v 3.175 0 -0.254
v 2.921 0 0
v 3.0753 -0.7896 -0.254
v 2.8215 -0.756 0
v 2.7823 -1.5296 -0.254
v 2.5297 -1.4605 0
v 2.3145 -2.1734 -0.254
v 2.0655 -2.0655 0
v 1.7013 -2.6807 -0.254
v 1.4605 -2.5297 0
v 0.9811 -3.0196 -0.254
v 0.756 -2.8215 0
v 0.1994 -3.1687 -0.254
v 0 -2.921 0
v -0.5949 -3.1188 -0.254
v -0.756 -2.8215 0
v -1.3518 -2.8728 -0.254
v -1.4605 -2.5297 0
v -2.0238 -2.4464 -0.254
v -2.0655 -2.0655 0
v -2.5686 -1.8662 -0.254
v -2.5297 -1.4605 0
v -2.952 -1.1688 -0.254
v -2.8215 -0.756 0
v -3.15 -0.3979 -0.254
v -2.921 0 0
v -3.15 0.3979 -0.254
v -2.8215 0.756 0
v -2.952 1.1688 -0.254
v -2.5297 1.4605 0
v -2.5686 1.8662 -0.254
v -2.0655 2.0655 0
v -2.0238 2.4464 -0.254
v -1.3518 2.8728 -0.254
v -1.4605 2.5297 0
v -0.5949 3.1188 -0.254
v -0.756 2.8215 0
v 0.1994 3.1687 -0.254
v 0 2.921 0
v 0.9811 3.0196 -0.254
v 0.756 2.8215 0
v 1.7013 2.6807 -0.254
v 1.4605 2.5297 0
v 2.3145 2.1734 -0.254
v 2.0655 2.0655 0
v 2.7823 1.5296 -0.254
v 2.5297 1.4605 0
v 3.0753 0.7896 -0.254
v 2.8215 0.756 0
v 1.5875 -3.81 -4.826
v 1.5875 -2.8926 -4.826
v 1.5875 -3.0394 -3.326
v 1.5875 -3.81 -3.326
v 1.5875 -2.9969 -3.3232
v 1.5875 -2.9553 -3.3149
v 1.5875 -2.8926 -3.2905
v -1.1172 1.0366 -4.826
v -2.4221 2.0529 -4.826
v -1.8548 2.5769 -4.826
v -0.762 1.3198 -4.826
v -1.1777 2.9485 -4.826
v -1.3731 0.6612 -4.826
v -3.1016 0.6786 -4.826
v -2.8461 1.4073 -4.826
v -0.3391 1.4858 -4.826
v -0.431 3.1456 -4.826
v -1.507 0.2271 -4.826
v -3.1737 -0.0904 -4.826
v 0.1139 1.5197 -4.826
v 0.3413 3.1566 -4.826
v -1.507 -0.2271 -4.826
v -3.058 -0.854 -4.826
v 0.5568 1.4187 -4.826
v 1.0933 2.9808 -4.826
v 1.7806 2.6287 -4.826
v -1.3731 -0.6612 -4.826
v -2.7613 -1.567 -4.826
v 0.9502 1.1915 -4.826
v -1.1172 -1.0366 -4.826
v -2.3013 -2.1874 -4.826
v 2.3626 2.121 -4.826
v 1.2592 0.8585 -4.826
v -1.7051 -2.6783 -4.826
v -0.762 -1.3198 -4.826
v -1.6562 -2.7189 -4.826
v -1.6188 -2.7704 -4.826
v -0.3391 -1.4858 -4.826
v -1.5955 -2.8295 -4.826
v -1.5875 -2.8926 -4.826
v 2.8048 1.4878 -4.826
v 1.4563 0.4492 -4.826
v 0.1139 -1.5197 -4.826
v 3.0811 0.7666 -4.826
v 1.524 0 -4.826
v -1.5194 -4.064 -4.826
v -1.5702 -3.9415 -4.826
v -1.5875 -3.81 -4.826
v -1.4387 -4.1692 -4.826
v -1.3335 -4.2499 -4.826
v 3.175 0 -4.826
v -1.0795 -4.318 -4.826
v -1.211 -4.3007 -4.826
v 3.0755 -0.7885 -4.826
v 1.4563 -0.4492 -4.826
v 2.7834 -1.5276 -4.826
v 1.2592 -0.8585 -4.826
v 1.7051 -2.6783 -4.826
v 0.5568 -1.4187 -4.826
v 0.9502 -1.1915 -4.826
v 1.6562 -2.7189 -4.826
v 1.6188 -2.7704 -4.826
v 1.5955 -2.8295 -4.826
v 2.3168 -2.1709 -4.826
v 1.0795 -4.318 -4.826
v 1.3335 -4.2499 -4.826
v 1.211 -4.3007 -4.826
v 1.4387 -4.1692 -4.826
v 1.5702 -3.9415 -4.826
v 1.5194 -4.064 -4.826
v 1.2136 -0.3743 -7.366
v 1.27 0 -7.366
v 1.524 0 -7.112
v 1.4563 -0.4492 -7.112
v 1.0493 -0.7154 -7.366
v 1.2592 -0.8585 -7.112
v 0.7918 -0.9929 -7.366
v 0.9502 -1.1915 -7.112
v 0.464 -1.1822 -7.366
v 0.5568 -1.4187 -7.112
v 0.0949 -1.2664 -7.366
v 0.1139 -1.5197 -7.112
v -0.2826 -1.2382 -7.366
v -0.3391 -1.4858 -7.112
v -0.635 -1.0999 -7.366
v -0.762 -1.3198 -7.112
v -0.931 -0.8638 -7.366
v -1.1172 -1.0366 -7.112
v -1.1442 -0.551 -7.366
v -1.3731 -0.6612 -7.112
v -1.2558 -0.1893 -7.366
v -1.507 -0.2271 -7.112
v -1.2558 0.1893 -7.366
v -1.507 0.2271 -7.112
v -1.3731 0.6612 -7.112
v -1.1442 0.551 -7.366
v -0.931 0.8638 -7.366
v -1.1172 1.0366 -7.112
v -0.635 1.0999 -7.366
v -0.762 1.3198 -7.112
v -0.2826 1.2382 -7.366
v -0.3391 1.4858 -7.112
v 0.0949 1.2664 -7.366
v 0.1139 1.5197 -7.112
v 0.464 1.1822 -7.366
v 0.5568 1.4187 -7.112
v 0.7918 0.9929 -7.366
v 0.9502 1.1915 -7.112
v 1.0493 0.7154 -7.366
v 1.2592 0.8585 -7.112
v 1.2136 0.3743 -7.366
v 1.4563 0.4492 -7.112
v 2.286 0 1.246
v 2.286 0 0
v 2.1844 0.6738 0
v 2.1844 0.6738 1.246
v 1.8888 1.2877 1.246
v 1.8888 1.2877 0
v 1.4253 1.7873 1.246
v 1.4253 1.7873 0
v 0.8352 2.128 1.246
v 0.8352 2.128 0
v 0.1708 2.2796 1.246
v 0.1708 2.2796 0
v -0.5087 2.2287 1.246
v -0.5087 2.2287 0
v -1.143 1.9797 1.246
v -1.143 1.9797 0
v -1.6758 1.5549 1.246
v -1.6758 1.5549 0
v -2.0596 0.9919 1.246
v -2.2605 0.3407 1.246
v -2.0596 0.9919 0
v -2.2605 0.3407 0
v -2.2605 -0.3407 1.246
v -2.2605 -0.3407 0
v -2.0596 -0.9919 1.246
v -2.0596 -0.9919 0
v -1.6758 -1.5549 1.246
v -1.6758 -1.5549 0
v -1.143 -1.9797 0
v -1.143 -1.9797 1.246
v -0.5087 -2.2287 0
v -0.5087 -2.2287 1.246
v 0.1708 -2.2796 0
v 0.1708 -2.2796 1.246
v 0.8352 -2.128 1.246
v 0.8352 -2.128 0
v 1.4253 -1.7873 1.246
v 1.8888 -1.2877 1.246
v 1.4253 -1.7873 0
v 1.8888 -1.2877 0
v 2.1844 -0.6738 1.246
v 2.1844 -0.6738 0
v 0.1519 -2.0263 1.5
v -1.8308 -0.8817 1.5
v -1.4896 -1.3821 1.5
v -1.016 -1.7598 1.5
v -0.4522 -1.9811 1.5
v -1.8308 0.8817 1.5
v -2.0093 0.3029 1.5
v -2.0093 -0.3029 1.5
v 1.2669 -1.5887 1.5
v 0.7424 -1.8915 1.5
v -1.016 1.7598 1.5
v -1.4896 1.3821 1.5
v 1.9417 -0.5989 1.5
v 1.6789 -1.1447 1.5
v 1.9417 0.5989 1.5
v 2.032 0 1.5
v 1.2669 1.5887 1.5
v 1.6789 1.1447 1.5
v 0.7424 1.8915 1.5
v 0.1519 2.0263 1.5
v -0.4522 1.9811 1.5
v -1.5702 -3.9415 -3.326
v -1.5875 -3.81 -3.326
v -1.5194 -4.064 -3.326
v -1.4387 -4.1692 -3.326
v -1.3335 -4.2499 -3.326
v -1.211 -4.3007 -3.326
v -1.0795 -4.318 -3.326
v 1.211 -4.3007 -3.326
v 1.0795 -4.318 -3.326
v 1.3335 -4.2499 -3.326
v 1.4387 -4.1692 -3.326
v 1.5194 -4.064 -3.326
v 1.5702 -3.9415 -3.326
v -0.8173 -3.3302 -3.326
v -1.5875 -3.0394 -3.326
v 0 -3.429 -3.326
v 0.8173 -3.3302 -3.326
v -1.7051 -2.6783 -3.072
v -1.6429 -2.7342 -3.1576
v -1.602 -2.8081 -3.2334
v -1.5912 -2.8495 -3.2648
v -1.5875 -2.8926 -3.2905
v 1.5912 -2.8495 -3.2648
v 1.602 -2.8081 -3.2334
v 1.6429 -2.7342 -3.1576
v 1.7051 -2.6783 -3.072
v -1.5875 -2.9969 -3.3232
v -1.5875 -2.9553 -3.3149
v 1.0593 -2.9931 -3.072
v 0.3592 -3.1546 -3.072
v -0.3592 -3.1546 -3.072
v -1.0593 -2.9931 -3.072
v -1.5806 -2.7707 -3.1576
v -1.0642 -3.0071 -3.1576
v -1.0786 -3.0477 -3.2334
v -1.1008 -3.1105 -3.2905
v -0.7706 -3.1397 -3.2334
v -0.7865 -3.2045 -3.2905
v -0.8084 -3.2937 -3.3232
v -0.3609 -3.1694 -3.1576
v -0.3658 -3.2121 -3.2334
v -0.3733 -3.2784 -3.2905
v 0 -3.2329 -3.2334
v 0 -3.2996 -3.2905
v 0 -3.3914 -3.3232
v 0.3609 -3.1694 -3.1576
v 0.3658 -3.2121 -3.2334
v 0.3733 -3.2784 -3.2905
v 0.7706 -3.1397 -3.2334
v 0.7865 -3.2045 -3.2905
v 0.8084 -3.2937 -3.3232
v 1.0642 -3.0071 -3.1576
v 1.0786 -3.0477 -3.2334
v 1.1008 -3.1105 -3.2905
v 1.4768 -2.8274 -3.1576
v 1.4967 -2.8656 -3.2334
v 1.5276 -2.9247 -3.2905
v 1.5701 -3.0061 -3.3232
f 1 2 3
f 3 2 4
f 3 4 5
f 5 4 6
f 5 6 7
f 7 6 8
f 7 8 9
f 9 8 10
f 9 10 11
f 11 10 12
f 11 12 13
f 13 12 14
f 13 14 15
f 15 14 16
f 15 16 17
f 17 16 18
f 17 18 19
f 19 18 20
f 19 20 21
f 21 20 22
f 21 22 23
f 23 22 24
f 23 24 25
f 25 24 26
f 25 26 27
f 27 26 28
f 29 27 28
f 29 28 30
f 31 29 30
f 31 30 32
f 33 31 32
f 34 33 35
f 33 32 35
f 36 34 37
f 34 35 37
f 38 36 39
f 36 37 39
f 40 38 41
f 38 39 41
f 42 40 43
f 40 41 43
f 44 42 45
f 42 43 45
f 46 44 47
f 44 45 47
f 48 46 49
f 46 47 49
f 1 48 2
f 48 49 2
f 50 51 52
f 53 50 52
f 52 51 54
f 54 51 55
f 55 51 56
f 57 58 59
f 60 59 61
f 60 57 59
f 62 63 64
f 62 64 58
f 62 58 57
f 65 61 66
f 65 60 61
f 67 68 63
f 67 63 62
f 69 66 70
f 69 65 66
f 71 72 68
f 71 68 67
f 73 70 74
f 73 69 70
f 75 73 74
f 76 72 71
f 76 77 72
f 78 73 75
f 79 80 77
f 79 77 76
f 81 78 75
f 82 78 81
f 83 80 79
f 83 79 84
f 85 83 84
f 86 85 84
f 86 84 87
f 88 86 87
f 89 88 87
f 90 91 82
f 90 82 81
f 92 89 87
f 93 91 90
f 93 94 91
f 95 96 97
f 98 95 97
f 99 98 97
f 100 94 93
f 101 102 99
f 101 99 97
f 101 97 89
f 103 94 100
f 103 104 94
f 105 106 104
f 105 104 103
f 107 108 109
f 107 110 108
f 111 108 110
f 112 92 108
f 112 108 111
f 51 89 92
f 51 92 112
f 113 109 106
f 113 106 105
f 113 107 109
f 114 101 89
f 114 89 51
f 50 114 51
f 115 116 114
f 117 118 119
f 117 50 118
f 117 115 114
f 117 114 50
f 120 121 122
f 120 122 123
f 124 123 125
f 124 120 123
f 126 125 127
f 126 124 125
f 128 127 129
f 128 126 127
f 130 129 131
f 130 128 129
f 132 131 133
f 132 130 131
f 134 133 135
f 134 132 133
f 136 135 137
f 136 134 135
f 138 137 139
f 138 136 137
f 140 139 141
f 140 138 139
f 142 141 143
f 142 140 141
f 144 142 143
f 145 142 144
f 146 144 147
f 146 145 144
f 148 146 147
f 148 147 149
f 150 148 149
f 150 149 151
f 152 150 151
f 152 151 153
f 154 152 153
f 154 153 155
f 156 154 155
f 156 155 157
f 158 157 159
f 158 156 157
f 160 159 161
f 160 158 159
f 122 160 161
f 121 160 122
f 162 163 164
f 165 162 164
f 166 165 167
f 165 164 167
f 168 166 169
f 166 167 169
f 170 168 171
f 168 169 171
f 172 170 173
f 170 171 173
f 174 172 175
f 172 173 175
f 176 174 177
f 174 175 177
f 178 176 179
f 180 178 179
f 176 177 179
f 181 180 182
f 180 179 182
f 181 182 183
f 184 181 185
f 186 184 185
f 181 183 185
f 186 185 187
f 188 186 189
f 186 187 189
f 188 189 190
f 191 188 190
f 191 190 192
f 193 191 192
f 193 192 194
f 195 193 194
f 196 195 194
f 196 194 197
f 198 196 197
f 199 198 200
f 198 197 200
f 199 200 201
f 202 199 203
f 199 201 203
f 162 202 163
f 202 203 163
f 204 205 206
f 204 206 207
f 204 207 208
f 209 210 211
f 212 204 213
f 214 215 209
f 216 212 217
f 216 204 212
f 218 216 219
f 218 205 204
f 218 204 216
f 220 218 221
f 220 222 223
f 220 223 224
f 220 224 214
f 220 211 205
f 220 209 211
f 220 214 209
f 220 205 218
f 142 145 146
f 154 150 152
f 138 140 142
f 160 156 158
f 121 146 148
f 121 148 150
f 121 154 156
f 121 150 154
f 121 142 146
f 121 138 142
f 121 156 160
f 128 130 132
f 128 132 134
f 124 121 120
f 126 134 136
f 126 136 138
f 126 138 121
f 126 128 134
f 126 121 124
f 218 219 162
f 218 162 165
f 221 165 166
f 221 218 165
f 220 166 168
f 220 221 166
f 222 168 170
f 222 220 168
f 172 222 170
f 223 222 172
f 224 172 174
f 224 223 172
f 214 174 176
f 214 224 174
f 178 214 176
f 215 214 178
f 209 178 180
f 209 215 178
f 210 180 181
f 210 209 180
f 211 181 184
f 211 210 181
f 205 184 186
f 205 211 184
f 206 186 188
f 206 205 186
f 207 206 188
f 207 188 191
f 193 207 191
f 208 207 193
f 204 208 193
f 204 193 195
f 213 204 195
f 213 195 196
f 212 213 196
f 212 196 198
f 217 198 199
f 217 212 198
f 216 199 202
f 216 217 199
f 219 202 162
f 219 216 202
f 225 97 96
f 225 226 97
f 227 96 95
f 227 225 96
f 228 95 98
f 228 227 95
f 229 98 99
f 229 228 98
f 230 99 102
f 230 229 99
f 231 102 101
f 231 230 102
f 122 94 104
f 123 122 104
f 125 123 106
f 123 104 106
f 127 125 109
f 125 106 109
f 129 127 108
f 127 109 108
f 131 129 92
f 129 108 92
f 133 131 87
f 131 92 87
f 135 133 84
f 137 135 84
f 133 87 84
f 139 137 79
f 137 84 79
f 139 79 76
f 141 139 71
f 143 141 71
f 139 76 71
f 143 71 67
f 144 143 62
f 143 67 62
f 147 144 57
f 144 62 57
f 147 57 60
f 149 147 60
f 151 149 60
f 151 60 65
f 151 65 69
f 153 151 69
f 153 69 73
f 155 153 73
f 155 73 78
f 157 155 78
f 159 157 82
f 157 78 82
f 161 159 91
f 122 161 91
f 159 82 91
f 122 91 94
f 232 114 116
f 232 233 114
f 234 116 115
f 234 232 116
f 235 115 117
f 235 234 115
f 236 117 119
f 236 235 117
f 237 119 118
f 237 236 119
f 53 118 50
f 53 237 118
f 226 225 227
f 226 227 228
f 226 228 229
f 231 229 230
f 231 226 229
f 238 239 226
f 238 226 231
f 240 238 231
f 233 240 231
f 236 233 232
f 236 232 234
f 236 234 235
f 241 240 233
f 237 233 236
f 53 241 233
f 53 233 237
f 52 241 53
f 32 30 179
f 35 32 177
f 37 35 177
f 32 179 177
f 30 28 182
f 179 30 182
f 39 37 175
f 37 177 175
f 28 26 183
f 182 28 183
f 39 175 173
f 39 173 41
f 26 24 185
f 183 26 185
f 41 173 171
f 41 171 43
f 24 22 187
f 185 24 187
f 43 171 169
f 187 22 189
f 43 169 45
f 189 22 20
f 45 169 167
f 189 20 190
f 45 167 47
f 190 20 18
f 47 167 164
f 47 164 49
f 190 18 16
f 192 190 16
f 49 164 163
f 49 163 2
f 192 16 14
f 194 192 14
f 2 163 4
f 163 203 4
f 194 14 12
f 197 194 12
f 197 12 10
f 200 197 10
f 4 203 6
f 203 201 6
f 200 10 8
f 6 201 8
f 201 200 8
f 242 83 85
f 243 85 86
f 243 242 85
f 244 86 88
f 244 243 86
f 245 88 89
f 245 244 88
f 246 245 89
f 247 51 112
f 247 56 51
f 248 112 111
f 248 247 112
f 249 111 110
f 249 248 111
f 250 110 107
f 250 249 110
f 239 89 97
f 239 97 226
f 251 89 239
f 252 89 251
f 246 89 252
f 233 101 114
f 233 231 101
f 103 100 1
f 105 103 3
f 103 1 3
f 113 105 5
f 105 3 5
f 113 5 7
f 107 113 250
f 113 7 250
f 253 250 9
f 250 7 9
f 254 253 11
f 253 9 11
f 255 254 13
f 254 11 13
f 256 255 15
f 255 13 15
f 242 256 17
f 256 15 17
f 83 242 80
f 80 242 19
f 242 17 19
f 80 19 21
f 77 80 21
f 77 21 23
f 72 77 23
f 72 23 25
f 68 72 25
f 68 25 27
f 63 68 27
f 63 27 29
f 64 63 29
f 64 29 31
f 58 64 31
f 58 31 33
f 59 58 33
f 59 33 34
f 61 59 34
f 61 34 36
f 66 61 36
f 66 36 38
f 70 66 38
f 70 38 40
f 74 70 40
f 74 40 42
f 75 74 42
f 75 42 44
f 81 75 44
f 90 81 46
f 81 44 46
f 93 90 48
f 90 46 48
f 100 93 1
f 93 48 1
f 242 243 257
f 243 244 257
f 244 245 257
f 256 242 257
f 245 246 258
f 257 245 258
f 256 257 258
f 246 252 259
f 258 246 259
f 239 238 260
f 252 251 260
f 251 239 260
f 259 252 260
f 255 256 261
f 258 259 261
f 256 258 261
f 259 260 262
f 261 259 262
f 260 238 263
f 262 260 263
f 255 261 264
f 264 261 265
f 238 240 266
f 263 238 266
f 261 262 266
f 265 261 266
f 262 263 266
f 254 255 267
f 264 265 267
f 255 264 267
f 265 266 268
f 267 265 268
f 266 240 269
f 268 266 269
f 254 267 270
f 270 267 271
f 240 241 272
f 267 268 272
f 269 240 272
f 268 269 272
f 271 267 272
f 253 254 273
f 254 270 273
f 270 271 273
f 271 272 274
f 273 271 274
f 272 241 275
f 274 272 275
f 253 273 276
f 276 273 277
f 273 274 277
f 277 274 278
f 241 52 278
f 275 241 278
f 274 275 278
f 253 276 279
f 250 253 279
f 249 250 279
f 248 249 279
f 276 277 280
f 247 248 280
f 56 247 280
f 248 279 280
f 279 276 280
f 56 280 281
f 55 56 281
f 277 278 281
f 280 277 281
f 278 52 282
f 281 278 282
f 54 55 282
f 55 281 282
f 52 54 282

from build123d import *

# Parameters (mm, degrees)
F0_R     = 2.286
F1_DEPTH = 1.5
F2_R     = 3.175
F2_R_2   = 2.286
F3_DEPTH = 4.826
F4_SIZE  = 0.254
F5_R     = 1.524
F6_DEPTH = 2.54
F7_W     = 3.175
F7_H     = 1.5
F8_DEPTH = 4.318
F9_R     = 0.508
F10_SIZE = 0.254
F11_R    = 0.254
F12_SIZE = 0.254


# Not quite as in the source:
# - a feature names something its author has since deleted; it is built from what else it names


with BuildPart() as f1:
    # F0 (on Top) → F1 (new body)
    with BuildSketch(Plane.XY):
        Circle(F0_R)
    extrude(amount=F1_DEPTH)

    # F2 (on face) → F3 (join)
    with BuildSketch(Plane(origin=(0, 0, 0), x_dir=(1, 0, 0), z_dir=(0, 0, -1))):
        Circle(F2_R)
        Circle(F2_R_2, mode=Mode.SUBTRACT)
        Circle(F2_R_2)
    extrude(amount=F3_DEPTH)

    # F4
    f4_edges = [f1.edges().sort_by_distance(p)[0] for p in [
        (-2.286, 0, 1.5),
    ]]
    chamfer(f4_edges, length=F4_SIZE)

    # F5 (on face) → F6 (join)
    with BuildSketch(Plane(origin=(0, 0, -4.826), x_dir=(1, 0, 0), z_dir=(0, 0, -1))):
        Circle(F5_R)
    extrude(amount=F6_DEPTH)

    # F7 (on Front) → F8 (join)
    with BuildSketch(Plane.XZ):
        with Locations((0, -4.076)):
            Rectangle(F7_W, F7_H)
    extrude(amount=F8_DEPTH)

    # F9
    f9_edges = [f1.edges().sort_by_distance(p)[0] for p in [
        (-1.5875, -4.318, -4.076),
        (1.5875, -4.318, -4.076),
    ]]
    fillet(f9_edges, radius=F9_R)

    # F10
    f10_edges = [f1.edges().sort_by_distance(p)[0] for p in [
        (-1.524, 0, -7.366),
    ]]
    chamfer(f10_edges, length=F10_SIZE)

    # F11
    f11_edges = [f1.edges().sort_by_distance(p)[0] for p in [
        (0, -3.175, -3.326),
        (1.5875, -2.749631, -4.076),
        (-1.5875, -2.749631, -4.076),
    ]]
    fillet(f11_edges, radius=F11_R)

    # F12
    f12_edges = [f1.edges().sort_by_distance(p)[0] for p in [
        (-3.175, 0, 0),
    ]]
    chamfer(f12_edges, length=F12_SIZE)


solid = f1.part
